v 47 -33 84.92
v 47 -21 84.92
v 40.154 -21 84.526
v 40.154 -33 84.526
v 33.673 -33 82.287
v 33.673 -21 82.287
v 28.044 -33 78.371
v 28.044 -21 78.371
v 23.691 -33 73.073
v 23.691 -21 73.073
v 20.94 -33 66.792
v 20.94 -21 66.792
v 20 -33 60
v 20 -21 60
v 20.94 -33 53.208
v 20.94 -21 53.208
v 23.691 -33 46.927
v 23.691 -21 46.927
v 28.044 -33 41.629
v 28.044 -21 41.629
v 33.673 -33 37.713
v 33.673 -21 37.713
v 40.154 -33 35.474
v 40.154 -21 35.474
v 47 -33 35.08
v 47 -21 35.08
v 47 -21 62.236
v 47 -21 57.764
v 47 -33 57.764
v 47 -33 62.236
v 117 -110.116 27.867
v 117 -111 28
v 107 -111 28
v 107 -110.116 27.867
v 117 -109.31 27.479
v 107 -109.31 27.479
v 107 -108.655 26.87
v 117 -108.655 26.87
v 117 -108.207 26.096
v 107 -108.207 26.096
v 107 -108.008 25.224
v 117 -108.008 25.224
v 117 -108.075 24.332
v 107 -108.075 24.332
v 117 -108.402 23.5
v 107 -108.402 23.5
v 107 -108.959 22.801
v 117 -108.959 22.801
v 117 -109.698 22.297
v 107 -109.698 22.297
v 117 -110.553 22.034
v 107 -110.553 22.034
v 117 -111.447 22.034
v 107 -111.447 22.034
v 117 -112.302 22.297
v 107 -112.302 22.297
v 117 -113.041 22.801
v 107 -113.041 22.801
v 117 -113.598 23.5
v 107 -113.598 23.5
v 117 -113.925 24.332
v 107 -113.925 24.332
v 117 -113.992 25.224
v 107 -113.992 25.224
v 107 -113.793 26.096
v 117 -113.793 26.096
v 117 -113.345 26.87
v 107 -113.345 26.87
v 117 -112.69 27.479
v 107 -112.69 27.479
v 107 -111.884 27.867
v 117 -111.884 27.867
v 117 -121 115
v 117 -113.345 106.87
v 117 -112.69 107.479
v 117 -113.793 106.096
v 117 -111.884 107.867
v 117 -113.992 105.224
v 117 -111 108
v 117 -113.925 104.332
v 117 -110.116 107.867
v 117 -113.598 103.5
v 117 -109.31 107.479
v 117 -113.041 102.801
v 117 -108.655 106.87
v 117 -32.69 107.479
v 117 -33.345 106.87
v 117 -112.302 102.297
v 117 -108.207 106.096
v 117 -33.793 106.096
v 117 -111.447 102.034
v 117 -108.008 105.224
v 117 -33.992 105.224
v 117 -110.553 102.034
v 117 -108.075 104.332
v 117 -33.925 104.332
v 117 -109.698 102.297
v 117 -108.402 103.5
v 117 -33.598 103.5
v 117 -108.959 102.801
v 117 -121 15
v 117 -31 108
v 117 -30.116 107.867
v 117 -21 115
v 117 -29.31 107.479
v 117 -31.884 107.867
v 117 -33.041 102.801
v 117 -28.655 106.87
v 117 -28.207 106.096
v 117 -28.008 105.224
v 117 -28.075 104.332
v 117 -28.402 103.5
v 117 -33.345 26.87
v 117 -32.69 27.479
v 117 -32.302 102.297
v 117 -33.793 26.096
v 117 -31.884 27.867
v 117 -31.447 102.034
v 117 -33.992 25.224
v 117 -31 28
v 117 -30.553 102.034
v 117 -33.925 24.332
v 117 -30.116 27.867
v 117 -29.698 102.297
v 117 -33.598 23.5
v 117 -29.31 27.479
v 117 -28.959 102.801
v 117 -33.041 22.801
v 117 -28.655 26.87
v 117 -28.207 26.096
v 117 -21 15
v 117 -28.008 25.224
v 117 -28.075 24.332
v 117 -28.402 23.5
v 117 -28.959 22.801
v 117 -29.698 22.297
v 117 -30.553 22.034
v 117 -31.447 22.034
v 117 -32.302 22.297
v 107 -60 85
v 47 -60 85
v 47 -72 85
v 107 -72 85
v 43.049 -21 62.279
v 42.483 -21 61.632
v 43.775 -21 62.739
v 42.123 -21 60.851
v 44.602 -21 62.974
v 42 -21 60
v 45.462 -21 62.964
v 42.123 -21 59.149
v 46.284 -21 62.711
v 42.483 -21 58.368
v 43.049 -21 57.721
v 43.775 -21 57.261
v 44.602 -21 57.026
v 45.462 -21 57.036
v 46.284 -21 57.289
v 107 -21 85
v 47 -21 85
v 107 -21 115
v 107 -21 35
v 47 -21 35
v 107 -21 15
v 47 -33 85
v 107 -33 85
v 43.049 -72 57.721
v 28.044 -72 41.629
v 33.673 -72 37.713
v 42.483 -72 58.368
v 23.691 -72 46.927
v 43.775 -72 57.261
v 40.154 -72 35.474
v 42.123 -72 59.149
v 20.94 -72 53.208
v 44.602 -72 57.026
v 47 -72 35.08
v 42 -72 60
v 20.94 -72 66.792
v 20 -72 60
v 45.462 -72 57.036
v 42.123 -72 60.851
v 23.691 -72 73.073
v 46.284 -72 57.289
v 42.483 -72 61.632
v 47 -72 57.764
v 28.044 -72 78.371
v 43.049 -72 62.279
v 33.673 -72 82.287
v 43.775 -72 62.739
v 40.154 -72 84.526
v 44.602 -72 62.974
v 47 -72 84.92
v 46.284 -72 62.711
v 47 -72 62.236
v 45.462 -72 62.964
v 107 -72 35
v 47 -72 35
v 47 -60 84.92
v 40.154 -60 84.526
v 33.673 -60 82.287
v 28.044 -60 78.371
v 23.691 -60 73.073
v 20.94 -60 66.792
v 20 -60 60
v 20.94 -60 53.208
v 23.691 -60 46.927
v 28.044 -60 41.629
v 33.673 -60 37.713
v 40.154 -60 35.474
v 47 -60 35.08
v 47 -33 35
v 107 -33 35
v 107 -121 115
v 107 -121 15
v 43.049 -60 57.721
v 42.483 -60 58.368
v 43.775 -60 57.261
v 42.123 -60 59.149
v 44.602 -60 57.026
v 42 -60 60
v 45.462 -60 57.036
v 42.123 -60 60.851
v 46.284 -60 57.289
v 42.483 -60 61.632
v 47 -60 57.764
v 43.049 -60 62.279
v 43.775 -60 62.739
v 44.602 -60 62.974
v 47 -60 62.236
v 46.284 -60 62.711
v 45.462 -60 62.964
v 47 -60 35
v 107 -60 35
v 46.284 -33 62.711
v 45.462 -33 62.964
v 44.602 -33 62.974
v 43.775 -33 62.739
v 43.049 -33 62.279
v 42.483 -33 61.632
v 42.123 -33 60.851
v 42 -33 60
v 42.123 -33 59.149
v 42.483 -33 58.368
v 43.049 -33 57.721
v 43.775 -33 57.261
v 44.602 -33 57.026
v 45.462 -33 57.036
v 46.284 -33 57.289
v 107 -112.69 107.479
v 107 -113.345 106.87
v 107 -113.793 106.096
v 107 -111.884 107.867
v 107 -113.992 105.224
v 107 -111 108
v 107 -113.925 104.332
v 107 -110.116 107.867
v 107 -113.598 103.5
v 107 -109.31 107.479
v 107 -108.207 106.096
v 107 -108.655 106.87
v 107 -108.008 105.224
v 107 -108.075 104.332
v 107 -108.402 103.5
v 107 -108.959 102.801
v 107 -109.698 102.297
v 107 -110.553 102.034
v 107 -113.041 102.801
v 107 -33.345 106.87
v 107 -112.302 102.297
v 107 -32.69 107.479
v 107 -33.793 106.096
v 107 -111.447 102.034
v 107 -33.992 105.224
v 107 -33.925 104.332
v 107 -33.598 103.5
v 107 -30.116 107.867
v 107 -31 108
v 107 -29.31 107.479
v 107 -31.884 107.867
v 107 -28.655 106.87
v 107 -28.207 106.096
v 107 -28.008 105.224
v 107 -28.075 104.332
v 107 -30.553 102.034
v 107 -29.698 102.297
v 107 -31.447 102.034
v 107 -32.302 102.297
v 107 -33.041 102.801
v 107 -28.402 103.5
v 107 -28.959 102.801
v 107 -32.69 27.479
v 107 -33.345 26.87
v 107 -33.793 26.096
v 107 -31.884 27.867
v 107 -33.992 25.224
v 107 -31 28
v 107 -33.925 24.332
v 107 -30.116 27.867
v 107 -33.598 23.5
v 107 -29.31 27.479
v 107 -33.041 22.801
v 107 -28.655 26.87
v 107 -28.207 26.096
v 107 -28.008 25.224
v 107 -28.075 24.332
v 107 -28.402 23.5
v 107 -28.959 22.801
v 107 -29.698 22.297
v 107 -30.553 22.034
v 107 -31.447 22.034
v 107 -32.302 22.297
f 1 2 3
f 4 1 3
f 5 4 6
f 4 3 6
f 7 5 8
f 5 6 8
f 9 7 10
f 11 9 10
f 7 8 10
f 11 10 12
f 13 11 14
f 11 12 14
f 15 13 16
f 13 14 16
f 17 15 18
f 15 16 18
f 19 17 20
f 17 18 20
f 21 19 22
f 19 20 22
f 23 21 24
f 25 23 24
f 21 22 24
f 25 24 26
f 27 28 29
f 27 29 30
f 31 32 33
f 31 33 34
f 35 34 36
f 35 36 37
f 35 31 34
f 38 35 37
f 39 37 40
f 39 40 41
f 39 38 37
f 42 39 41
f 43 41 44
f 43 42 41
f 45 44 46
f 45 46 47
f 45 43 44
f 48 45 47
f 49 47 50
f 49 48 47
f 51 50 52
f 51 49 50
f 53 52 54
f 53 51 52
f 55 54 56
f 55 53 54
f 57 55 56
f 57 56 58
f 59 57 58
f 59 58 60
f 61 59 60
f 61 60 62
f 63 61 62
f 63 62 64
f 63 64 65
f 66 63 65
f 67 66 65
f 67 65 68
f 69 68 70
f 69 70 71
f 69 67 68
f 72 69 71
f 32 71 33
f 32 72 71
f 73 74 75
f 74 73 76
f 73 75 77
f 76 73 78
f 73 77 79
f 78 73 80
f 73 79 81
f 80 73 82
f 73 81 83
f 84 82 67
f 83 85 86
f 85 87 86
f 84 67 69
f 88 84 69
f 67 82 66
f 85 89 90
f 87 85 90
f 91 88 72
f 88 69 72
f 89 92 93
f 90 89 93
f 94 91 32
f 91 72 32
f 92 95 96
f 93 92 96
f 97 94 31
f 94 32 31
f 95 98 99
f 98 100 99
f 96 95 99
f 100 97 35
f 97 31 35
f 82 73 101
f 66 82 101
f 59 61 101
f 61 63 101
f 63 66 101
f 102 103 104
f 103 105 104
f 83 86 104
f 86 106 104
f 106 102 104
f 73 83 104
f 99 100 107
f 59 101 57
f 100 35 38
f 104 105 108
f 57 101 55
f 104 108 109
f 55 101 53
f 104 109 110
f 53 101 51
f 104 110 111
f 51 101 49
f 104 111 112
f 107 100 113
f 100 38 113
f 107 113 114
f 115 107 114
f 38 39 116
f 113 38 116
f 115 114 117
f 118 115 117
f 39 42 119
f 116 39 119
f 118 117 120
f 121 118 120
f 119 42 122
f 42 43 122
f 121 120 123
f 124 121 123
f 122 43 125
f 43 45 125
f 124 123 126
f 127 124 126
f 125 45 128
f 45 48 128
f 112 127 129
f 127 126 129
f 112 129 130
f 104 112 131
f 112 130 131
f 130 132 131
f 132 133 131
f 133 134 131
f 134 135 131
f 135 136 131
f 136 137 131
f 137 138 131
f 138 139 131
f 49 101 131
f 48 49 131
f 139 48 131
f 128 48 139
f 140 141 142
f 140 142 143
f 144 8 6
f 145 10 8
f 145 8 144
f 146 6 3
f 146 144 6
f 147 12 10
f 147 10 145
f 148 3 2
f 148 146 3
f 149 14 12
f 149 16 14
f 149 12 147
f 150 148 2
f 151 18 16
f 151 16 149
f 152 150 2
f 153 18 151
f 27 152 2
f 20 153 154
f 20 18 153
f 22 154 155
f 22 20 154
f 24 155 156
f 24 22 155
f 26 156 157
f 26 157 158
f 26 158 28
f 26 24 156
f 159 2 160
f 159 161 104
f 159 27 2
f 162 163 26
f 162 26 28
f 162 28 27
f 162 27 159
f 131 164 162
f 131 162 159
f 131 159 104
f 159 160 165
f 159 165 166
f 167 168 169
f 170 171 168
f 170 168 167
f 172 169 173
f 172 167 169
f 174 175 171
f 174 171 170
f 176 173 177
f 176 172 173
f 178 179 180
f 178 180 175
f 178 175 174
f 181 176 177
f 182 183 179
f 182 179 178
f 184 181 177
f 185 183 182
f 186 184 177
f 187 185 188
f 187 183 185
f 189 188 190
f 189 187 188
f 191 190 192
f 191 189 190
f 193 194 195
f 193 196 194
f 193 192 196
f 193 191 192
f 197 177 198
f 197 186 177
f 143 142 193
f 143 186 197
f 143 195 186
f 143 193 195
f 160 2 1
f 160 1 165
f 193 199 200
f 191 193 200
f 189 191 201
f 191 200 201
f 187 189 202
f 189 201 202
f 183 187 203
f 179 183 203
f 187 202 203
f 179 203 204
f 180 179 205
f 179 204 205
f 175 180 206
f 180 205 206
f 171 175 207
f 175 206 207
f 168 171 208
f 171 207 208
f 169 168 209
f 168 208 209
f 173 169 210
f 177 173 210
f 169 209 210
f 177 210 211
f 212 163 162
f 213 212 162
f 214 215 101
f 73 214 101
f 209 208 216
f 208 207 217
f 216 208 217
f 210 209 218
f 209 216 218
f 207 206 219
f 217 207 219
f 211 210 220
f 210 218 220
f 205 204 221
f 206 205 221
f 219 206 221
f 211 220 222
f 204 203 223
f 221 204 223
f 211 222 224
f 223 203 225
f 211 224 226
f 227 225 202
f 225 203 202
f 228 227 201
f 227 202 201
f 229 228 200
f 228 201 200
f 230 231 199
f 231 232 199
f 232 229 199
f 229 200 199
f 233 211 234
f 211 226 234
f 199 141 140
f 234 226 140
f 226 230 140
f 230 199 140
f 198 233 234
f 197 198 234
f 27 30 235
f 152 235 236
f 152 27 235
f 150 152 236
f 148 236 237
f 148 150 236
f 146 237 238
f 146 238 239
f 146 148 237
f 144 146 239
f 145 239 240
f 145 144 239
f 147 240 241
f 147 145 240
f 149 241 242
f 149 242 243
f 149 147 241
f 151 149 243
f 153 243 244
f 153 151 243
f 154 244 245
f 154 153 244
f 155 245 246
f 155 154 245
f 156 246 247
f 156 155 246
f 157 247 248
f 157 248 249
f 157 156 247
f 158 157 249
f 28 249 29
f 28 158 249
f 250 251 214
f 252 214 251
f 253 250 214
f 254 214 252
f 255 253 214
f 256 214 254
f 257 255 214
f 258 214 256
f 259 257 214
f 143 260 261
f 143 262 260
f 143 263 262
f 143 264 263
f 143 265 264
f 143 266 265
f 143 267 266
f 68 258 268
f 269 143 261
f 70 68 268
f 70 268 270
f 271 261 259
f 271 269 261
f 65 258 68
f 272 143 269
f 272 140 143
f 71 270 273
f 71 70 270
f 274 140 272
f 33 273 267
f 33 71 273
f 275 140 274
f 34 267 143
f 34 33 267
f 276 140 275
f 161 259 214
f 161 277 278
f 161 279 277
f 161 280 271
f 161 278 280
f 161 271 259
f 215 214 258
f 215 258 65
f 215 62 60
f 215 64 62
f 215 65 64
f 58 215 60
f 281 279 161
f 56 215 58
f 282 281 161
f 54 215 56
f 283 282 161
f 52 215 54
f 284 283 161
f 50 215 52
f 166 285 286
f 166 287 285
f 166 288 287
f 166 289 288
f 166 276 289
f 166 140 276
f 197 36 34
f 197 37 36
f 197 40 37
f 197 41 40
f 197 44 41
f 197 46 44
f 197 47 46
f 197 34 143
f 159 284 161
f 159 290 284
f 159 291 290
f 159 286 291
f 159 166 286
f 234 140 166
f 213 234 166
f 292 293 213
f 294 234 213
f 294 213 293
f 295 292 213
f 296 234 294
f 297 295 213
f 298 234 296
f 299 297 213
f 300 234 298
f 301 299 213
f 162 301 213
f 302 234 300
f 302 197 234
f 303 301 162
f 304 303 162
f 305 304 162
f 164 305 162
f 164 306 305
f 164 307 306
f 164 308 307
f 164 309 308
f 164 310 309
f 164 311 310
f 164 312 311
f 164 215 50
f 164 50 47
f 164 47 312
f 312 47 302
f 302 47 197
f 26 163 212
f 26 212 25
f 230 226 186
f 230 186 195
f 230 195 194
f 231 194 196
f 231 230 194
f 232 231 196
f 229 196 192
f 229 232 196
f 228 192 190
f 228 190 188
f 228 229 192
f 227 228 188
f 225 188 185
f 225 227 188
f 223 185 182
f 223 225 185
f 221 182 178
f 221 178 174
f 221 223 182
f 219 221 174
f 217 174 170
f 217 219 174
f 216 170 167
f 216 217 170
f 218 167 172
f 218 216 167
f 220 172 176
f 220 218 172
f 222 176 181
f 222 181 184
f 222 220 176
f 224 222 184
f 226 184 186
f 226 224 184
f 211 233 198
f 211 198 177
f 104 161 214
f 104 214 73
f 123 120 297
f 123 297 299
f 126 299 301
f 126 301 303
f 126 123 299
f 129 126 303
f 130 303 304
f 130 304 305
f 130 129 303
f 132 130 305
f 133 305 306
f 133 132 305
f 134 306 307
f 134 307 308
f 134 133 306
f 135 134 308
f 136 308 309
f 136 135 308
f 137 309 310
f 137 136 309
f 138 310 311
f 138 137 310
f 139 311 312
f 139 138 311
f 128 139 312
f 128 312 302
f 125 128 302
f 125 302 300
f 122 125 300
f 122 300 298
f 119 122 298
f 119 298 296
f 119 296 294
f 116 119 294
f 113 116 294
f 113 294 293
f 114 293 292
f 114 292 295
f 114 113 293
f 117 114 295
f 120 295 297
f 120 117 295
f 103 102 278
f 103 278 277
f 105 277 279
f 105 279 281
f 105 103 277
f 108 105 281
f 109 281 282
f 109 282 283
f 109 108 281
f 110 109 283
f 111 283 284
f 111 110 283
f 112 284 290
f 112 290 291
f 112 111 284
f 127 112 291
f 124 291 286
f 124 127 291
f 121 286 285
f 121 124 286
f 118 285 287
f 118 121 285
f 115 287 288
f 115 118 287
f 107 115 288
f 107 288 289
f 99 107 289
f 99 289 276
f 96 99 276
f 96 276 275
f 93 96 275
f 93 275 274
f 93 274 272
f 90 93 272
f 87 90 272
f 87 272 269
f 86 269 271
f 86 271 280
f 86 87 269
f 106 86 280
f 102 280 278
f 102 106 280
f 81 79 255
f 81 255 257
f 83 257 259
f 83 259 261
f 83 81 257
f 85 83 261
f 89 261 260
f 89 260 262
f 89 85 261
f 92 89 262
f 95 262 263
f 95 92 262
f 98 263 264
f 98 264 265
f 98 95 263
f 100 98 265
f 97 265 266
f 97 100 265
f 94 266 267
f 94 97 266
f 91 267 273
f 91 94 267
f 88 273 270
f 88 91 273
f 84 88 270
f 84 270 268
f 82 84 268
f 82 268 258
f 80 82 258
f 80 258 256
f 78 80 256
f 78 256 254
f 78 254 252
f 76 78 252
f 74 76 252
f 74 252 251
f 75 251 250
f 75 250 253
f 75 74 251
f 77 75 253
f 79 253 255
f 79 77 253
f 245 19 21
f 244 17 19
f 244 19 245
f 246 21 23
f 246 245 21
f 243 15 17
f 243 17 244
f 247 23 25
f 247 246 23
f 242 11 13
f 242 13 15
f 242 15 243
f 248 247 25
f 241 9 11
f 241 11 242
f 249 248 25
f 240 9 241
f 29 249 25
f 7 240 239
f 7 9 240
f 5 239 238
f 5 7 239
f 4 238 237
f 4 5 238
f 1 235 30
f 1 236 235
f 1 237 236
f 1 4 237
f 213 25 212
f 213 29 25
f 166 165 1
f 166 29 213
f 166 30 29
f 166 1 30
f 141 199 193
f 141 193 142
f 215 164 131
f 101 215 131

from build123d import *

# Parameters (mm, degrees)
CYLINDER043_R             = 3
CYLINDER043_DEPTH         = 10
CYLINDER042_R             = 3
CYLINDER042_DEPTH         = 10
CYLINDER041_R             = 3
CYLINDER041_DEPTH         = 10
CYLINDER044_R             = 3
CYLINDER044_DEPTH         = 10
CYLINDER019_R             = 3
CYLINDER019_DEPTH         = 12
CYLINDER018_R             = 25
CYLINDER018_DEPTH         = 12
BOX016_W                  = 70
BOX016_H                  = 50
BOX016_DEPTH              = 12
FUSION009_PLACEMENT_ANGLE = 90
BOX017_W                  = 10
BOX017_H                  = 100
BOX017_DEPTH              = 100
CYLINDER017_R             = 3
CYLINDER017_DEPTH         = 12
CYLINDER016_R             = 25
CYLINDER016_DEPTH         = 12
BOX015_W                  = 70
BOX015_H                  = 50
BOX015_DEPTH              = 12
FUSION008_PLACEMENT_ANGLE = 90


with BuildPart() as cilindro030:
    # Cylinder043 → Cylinder043 (new body)
    with BuildSketch(Plane(origin=(117, -31, 25), x_dir=(0, 0, 1), z_dir=(-1, 0, 0))):
        Circle(CYLINDER043_R)
    extrude(amount=CYLINDER043_DEPTH)


with BuildPart() as cilindro029:
    # Cylinder042 → Cylinder042 (new body)
    with BuildSketch(Plane(origin=(117, -111, 25), x_dir=(0, 0, 1), z_dir=(-1, 0, 0))):
        Circle(CYLINDER042_R)
    extrude(amount=CYLINDER042_DEPTH)


with BuildPart() as cilindro028:
    # Cylinder041 → Cylinder041 (new body)
    with BuildSketch(Plane(origin=(117, -31, 105), x_dir=(0, 0, 1), z_dir=(-1, 0, 0))):
        Circle(CYLINDER041_R)
    extrude(amount=CYLINDER041_DEPTH)


with BuildPart() as afu_tornillos:
    # Cylinder044 → Cylinder044 (new body)
    with BuildSketch(Plane(origin=(117, -111, 105), x_dir=(0, 0, 1), z_dir=(-1, 0, 0))):
        Circle(CYLINDER044_R)
    extrude(amount=CYLINDER044_DEPTH)

    # Fusion022: union Cilindro030, Cilindro029, Cilindro028
    add(cilindro030.part)
    add(cilindro029.part)
    add(cilindro028.part)


with BuildPart() as cilindro011:
    # Cylinder019 → Cylinder019 (new body)
    with BuildSketch(Plane(origin=(29, -45, -13), x_dir=(1, 0, 0), z_dir=(0, 0, 1))):
        Circle(CYLINDER019_R)
    extrude(amount=CYLINDER019_DEPTH)


with BuildPart() as cut018:
    # Cylinder018 → Cylinder018 (new body)
    with BuildSketch(Plane(origin=(29, -45, -13), x_dir=(1, 0, 0), z_dir=(0, 0, 1))):
        Circle(CYLINDER018_R)
    extrude(amount=CYLINDER018_DEPTH)

    # Cut018: cut Cilindro011
    add(cilindro011.part, mode=Mode.SUBTRACT)


with BuildPart() as lateral001:
    # Box016 → Box016 (new body)
    with BuildSketch(Plane(origin=(31, -70, -13), x_dir=(1, 0, 0), z_dir=(0, 0, 1))):
        with Locations((35, 25)):
            Rectangle(BOX016_W, BOX016_H)
    extrude(amount=BOX016_DEPTH)

    # Fusion009: union Cut018
    add(cut018.part)


with BuildPart() as lateral001_1:
    # Fusion009 placement: moved
    add(lateral001.part.moved(Location((16, -73, 105))).rotate(Axis((16, -73, 105), (1, 0, 0)), FUSION009_PLACEMENT_ANGLE))


with BuildPart() as baseejez:
    # Box017 → Box017 (new body)
    with BuildSketch(Plane(origin=(107, -121, 15), x_dir=(1, 0, 0), z_dir=(0, 0, 1))):
        with Locations((5, 50)):
            Rectangle(BOX017_W, BOX017_H)
    extrude(amount=BOX017_DEPTH)


with BuildPart() as cilindro009:
    # Cylinder017 → Cylinder017 (new body)
    with BuildSketch(Plane(origin=(29, -45, -13), x_dir=(1, 0, 0), z_dir=(0, 0, 1))):
        Circle(CYLINDER017_R)
    extrude(amount=CYLINDER017_DEPTH)


with BuildPart() as cut017:
    # Cylinder016 → Cylinder016 (new body)
    with BuildSketch(Plane(origin=(29, -45, -13), x_dir=(1, 0, 0), z_dir=(0, 0, 1))):
        Circle(CYLINDER016_R)
    extrude(amount=CYLINDER016_DEPTH)

    # Cut017: cut Cilindro009
    add(cilindro009.part, mode=Mode.SUBTRACT)


with BuildPart() as cut038:
    # Box015 → Box015 (new body)
    with BuildSketch(Plane(origin=(31, -70, -13), x_dir=(1, 0, 0), z_dir=(0, 0, 1))):
        with Locations((35, 25)):
            Rectangle(BOX015_W, BOX015_H)
    extrude(amount=BOX015_DEPTH)

    # Fusion008: union Cut017
    add(cut017.part)


with BuildPart() as cut038_1:
    # Fusion008 placement: moved
    add(cut038.part.moved(Location((16, -34, 105))).rotate(Axis((16, -34, 105), (1, 0, 0)), FUSION008_PLACEMENT_ANGLE))

    # Fusion020: union lateral001, BaseEjeZ
    add(lateral001_1.part)
    add(baseejez.part)

    # Cut038: cut Afu tornillos
    add(afu_tornillos.part, mode=Mode.SUBTRACT)


solid = cut038_1.part
